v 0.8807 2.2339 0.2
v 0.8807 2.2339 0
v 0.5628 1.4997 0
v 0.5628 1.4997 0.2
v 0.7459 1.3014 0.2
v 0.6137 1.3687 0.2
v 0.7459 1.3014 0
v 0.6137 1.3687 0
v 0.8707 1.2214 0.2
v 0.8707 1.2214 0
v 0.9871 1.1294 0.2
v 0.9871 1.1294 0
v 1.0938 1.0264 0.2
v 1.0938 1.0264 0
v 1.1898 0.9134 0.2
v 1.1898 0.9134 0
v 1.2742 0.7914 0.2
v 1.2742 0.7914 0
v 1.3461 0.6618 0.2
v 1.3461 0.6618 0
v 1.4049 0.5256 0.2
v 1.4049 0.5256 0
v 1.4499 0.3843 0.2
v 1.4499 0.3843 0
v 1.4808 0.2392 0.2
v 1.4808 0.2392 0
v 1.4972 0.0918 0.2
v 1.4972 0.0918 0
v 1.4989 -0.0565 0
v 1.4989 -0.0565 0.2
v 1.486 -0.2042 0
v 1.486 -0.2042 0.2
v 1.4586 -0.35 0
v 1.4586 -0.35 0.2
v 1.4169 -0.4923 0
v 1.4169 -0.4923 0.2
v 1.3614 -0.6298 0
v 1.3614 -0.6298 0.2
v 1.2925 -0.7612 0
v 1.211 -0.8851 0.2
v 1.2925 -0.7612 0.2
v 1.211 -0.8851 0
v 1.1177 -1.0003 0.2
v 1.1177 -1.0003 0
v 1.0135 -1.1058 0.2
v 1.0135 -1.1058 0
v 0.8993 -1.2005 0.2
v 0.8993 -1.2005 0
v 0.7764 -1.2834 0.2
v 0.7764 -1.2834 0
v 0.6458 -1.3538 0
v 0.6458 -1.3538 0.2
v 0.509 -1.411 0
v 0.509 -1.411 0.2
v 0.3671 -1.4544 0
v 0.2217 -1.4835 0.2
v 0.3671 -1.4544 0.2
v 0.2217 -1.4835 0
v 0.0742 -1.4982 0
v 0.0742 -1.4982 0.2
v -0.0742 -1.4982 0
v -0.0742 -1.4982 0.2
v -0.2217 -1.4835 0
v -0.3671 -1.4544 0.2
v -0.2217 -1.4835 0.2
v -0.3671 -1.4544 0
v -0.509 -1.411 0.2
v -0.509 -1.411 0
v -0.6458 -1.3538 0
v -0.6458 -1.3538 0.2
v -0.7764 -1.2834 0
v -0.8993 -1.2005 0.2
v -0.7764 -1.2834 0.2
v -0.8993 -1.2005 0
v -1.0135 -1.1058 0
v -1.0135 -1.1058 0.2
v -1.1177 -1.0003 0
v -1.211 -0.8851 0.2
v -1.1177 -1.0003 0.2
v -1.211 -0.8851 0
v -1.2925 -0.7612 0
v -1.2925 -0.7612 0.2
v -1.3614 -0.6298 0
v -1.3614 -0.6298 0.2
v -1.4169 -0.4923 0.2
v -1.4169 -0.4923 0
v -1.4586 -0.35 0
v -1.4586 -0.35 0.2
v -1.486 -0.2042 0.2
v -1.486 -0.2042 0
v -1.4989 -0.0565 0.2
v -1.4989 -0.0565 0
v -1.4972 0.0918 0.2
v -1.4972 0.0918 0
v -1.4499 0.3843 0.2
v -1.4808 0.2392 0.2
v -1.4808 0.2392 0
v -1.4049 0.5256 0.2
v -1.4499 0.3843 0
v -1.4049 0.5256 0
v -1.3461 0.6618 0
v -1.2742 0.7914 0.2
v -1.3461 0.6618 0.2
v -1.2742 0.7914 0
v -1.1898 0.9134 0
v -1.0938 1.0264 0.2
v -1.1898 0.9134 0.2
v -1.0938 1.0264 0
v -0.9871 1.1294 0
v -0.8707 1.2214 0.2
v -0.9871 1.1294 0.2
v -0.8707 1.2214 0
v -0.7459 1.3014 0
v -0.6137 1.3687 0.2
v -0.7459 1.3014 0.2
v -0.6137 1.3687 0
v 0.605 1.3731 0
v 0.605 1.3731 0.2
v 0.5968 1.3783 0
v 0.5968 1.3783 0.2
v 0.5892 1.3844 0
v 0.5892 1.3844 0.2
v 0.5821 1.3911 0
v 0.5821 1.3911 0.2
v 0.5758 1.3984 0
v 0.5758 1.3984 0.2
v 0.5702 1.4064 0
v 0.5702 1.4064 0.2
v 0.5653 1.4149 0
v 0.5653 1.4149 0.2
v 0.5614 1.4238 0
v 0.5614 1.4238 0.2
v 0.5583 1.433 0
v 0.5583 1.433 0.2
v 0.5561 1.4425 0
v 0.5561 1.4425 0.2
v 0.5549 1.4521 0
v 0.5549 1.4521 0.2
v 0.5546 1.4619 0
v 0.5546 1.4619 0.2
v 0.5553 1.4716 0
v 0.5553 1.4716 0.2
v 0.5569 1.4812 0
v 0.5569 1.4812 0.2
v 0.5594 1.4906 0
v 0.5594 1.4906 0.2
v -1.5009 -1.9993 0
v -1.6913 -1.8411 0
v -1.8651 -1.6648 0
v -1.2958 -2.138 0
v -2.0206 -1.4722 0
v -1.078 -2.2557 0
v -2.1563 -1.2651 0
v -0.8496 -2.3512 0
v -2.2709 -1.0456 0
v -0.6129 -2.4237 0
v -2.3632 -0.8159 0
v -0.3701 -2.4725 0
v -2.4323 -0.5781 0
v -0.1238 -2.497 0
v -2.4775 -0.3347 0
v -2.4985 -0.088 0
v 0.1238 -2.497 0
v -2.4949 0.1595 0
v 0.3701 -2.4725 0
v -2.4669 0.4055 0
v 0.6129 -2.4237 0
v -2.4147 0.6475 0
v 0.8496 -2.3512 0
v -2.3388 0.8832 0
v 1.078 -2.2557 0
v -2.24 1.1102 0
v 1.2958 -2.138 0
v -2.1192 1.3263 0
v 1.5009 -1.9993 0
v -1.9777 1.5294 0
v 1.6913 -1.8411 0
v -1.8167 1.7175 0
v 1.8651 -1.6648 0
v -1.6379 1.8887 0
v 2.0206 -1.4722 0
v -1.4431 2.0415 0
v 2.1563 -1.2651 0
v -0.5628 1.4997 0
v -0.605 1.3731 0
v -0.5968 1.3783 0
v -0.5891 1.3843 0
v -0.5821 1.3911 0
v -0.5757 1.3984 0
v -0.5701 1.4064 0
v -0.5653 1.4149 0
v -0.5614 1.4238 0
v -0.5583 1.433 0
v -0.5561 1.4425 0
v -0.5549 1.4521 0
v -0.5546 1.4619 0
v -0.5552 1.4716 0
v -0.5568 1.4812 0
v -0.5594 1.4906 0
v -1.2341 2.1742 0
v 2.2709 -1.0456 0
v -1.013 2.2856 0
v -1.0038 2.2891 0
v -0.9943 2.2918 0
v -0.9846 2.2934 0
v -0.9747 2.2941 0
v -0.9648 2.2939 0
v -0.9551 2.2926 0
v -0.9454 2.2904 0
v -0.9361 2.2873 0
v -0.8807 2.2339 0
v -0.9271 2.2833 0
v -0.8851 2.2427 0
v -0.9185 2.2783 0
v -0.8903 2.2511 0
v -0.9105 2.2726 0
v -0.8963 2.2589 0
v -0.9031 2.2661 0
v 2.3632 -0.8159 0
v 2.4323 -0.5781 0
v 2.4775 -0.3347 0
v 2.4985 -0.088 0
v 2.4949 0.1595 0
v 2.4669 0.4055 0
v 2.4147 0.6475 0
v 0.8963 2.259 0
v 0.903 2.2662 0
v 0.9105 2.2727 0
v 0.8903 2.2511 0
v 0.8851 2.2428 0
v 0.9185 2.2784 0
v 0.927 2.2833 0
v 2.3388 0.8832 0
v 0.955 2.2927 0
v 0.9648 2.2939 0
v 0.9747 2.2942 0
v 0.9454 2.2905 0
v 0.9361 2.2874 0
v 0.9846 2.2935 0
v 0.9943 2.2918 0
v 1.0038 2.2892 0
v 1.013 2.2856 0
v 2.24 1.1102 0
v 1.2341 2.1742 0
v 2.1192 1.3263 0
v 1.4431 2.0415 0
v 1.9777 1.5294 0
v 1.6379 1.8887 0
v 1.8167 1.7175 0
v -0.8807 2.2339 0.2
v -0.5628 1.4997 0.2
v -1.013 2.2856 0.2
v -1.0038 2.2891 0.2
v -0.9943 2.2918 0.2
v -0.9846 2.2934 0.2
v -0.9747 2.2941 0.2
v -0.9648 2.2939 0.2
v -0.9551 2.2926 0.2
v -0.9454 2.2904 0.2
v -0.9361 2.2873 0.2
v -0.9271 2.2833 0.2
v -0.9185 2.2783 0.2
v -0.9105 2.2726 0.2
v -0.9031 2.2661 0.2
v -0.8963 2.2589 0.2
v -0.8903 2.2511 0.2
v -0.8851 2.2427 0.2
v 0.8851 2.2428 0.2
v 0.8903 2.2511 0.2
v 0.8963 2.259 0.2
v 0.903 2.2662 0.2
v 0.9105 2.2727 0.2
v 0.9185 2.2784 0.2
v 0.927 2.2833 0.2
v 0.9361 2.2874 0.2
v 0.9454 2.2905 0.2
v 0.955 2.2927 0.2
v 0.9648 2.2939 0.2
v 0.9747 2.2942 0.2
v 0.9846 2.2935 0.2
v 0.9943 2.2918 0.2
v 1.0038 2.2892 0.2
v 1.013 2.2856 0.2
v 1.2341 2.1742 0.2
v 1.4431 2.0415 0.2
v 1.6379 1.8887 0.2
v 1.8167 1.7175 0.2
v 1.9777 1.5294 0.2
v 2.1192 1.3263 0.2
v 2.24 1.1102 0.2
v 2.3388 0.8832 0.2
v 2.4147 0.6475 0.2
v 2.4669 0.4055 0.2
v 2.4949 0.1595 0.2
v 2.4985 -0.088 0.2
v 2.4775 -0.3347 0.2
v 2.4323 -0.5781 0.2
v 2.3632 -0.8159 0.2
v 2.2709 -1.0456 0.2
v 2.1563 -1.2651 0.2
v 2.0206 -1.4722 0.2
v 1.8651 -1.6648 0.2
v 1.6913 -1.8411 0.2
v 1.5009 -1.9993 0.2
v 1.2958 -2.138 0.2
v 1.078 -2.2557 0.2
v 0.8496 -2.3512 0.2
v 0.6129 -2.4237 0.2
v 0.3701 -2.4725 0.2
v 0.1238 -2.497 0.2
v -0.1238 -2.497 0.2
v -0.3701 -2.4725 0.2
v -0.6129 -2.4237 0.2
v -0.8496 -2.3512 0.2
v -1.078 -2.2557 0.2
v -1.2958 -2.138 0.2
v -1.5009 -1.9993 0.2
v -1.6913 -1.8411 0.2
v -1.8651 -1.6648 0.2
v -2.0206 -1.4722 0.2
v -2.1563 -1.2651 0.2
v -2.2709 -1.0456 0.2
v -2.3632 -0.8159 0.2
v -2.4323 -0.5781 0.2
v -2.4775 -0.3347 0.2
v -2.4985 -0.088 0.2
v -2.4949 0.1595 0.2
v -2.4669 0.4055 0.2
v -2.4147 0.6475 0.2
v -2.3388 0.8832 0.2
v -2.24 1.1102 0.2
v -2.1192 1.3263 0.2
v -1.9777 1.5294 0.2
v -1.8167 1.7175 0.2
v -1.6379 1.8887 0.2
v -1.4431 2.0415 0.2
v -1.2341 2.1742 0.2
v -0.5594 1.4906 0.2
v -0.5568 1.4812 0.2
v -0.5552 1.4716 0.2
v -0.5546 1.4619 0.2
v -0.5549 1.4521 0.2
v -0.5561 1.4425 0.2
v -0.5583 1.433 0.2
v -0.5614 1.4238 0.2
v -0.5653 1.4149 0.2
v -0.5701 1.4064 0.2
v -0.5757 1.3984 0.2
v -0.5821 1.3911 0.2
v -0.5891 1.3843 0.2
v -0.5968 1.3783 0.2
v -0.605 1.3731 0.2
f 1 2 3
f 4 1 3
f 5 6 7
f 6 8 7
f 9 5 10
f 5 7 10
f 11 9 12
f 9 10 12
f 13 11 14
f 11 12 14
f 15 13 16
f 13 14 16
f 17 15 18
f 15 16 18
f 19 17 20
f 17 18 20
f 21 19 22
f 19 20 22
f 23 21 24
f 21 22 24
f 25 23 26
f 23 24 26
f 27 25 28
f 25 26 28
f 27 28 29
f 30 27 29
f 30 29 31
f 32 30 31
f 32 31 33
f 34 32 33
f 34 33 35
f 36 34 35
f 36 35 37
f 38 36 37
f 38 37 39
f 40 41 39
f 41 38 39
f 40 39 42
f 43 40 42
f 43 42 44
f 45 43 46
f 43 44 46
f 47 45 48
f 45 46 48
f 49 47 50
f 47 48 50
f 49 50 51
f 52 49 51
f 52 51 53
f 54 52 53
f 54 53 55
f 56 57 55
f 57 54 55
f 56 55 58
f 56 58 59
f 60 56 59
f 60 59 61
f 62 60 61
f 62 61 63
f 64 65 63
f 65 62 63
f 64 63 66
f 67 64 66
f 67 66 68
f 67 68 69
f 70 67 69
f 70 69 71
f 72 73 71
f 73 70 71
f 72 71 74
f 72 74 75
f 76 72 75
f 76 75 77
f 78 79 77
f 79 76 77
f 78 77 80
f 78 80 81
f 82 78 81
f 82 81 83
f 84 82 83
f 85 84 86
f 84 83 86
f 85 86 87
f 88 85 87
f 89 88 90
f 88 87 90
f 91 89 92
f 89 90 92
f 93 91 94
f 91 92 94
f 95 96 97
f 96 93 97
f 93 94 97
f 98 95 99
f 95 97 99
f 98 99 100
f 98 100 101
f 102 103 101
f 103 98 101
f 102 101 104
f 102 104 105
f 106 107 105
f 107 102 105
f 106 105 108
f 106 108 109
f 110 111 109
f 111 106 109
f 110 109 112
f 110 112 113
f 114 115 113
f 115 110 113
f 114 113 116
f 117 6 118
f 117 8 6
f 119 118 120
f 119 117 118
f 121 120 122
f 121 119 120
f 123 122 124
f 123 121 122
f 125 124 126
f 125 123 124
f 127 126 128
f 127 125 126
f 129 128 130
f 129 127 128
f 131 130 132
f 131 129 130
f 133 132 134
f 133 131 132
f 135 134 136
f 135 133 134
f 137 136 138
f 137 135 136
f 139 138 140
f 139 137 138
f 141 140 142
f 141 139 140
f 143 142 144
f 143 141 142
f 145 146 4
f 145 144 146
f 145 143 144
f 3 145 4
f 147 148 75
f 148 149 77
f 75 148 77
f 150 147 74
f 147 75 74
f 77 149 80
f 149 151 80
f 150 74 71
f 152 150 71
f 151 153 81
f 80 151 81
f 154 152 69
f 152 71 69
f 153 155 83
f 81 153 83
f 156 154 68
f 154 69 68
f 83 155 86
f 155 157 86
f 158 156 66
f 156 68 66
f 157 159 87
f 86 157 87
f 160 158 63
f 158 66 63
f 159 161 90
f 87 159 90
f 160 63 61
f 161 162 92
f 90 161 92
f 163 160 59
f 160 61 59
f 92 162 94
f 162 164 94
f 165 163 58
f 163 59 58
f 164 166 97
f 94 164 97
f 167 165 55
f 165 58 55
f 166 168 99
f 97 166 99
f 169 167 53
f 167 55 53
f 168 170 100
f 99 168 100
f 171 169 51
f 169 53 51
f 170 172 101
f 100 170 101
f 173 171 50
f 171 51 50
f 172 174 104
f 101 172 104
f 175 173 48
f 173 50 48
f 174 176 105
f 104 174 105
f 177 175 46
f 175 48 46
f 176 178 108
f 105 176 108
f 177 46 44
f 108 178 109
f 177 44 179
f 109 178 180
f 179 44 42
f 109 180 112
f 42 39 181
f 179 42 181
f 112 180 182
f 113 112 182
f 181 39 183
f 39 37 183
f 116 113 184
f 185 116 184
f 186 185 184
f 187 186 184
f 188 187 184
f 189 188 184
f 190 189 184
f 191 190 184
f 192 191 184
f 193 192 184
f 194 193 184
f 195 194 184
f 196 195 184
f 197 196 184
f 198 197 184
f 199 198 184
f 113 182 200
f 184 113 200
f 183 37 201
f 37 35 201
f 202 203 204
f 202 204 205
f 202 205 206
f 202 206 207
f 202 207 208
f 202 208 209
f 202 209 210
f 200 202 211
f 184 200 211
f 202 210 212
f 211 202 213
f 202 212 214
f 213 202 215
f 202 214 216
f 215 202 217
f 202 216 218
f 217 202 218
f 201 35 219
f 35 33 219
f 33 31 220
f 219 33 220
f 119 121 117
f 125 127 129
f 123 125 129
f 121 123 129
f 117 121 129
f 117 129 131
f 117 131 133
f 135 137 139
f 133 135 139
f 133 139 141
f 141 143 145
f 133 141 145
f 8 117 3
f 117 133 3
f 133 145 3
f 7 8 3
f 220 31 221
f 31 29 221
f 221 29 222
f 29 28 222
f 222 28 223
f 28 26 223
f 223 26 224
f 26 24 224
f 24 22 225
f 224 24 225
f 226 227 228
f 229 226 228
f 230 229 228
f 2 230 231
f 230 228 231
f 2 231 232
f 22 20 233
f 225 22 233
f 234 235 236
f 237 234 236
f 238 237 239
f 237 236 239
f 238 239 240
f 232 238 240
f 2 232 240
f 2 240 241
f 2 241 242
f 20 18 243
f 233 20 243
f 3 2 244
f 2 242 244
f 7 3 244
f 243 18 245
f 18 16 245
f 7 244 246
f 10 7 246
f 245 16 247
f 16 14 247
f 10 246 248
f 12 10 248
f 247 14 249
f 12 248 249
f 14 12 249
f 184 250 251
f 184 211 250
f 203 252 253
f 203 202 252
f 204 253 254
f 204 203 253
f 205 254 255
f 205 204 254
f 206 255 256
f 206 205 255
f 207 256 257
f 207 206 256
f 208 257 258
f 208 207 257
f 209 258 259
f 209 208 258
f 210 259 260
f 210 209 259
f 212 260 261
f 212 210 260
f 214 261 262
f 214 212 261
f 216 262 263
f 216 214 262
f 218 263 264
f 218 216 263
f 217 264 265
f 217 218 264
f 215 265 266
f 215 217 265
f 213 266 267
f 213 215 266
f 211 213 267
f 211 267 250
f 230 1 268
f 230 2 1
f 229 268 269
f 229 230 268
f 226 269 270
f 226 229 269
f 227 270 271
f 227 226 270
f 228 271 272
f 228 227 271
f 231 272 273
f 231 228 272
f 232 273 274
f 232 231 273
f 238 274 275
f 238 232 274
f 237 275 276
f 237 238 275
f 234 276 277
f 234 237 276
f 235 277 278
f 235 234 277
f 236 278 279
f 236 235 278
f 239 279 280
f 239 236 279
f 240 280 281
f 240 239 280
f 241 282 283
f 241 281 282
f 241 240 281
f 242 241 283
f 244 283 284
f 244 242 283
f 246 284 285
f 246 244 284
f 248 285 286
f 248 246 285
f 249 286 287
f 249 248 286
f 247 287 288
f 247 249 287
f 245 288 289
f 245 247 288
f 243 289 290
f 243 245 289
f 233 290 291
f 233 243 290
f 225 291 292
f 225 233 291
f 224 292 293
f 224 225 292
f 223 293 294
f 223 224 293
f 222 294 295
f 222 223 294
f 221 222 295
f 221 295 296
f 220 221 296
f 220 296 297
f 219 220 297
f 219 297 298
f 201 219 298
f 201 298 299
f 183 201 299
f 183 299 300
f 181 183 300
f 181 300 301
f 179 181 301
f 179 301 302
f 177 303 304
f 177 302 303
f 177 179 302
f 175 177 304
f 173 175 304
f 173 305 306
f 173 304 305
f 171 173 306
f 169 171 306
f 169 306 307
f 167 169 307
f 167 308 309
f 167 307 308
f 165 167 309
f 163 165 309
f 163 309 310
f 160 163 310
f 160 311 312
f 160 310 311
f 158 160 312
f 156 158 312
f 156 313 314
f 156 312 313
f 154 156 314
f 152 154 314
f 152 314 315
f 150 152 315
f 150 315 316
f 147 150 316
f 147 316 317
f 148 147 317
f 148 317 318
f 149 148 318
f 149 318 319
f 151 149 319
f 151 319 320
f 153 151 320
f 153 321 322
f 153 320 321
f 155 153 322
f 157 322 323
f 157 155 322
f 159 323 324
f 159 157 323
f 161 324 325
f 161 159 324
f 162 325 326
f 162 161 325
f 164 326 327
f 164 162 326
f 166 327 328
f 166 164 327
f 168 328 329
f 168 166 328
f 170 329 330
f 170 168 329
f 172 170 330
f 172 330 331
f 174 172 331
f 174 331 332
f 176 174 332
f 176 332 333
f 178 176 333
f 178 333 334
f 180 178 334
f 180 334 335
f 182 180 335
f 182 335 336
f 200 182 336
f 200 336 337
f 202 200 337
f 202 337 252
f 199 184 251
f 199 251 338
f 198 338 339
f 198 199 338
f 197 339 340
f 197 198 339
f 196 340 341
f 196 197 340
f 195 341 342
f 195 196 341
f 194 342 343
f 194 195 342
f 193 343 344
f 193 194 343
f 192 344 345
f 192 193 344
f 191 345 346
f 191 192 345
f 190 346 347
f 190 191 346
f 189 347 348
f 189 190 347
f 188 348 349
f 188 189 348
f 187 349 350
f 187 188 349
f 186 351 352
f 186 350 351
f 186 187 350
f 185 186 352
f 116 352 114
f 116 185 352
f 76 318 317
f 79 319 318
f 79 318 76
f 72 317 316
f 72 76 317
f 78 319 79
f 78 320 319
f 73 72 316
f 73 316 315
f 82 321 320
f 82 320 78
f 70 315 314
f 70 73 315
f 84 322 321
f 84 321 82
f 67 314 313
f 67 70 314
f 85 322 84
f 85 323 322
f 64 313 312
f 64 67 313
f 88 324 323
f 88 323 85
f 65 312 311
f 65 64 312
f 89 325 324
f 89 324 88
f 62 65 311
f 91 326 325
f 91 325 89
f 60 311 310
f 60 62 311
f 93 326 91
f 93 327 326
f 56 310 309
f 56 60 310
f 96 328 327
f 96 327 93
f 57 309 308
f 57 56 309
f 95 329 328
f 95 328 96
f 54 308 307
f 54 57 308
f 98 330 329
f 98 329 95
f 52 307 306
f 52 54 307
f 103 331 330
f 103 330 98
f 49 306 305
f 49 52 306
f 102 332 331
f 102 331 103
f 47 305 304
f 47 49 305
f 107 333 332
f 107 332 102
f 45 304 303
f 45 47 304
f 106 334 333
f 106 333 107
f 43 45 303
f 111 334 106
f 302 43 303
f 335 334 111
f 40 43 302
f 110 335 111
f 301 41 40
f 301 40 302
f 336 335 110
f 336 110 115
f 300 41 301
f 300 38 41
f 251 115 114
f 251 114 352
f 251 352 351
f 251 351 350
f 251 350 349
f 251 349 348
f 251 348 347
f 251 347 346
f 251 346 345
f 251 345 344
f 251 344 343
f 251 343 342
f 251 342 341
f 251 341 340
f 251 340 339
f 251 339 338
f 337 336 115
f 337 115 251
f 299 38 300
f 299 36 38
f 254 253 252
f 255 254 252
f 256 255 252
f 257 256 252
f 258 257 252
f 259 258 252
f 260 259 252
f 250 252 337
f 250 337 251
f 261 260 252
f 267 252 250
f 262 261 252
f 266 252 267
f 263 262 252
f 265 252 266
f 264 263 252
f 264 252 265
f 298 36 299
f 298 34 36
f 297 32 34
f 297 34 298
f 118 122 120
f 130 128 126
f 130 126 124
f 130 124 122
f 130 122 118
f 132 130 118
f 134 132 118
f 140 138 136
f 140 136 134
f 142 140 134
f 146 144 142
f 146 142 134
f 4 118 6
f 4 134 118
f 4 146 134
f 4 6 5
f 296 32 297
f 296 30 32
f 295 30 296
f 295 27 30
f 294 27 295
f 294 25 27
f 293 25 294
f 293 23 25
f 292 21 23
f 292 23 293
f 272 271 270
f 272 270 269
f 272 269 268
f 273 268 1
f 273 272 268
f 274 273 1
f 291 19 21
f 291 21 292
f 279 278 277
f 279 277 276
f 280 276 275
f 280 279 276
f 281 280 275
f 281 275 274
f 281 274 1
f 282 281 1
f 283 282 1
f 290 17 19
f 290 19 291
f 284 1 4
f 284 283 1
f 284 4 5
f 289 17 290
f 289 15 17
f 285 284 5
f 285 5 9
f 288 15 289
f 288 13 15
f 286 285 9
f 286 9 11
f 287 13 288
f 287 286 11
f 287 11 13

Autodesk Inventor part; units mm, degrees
ref_plane "YZ Plane" through (0, 0, 0) normal (1, 0, 0) x (0, 1, 0)
ref_plane "XZ Plane" through (0, 0, 0) normal (0, 1, 0) x (-1, 0, 0)
ref_plane "XY Plane" through (0, 0, 0) normal (0, 0, 1) x (1, 0, 0)
sketch "Sketch1" plane through (0, 0, 0) normal (0, 0, 1) x (1, 0, 0)
  arc A0 (-0.6137, 1.3687) -> (0.6137, 1.3687) centre (0, 0) ccw
  arc A1 (-1.013, 2.2856) -> (1.013, 2.2856) centre (0, 0) ccw
  line L0 (-0.8807, 2.2339) -> (-0.5628, 1.4997)
  line L1 (0.8807, 2.2339) -> (0.5628, 1.4997)
  arc A2 (-0.8807, 2.2339) -> (-1.013, 2.2856) centre (-0.9724, 2.1942) ccw
  arc A3 (-0.6137, 1.3687) -> (-0.5628, 1.4997) centre (-0.6546, 1.46) ccw
  arc A4 (0.5628, 1.4997) -> (0.6137, 1.3687) centre (0.6546, 1.46) ccw
  arc A5 (1.013, 2.2856) -> (0.8807, 2.2339) centre (0.9724, 2.1942) ccw
  point P0 (-0.5223, 1.4061)
  point P1 (0.5223, 1.4061)
  point P2 (-0.9199, 2.3246)
  point P3 (0.9199, 2.3246)
  point P4 (-0.9199, 2.3246)
  dimension "d0" = 1.5
  dimension "d1" = 2.5
  dimension "d2" = 0.1
extrude "Extrusion1" add sketch "Sketch1" along normal blind 0.2
properties part number "Circlip"
